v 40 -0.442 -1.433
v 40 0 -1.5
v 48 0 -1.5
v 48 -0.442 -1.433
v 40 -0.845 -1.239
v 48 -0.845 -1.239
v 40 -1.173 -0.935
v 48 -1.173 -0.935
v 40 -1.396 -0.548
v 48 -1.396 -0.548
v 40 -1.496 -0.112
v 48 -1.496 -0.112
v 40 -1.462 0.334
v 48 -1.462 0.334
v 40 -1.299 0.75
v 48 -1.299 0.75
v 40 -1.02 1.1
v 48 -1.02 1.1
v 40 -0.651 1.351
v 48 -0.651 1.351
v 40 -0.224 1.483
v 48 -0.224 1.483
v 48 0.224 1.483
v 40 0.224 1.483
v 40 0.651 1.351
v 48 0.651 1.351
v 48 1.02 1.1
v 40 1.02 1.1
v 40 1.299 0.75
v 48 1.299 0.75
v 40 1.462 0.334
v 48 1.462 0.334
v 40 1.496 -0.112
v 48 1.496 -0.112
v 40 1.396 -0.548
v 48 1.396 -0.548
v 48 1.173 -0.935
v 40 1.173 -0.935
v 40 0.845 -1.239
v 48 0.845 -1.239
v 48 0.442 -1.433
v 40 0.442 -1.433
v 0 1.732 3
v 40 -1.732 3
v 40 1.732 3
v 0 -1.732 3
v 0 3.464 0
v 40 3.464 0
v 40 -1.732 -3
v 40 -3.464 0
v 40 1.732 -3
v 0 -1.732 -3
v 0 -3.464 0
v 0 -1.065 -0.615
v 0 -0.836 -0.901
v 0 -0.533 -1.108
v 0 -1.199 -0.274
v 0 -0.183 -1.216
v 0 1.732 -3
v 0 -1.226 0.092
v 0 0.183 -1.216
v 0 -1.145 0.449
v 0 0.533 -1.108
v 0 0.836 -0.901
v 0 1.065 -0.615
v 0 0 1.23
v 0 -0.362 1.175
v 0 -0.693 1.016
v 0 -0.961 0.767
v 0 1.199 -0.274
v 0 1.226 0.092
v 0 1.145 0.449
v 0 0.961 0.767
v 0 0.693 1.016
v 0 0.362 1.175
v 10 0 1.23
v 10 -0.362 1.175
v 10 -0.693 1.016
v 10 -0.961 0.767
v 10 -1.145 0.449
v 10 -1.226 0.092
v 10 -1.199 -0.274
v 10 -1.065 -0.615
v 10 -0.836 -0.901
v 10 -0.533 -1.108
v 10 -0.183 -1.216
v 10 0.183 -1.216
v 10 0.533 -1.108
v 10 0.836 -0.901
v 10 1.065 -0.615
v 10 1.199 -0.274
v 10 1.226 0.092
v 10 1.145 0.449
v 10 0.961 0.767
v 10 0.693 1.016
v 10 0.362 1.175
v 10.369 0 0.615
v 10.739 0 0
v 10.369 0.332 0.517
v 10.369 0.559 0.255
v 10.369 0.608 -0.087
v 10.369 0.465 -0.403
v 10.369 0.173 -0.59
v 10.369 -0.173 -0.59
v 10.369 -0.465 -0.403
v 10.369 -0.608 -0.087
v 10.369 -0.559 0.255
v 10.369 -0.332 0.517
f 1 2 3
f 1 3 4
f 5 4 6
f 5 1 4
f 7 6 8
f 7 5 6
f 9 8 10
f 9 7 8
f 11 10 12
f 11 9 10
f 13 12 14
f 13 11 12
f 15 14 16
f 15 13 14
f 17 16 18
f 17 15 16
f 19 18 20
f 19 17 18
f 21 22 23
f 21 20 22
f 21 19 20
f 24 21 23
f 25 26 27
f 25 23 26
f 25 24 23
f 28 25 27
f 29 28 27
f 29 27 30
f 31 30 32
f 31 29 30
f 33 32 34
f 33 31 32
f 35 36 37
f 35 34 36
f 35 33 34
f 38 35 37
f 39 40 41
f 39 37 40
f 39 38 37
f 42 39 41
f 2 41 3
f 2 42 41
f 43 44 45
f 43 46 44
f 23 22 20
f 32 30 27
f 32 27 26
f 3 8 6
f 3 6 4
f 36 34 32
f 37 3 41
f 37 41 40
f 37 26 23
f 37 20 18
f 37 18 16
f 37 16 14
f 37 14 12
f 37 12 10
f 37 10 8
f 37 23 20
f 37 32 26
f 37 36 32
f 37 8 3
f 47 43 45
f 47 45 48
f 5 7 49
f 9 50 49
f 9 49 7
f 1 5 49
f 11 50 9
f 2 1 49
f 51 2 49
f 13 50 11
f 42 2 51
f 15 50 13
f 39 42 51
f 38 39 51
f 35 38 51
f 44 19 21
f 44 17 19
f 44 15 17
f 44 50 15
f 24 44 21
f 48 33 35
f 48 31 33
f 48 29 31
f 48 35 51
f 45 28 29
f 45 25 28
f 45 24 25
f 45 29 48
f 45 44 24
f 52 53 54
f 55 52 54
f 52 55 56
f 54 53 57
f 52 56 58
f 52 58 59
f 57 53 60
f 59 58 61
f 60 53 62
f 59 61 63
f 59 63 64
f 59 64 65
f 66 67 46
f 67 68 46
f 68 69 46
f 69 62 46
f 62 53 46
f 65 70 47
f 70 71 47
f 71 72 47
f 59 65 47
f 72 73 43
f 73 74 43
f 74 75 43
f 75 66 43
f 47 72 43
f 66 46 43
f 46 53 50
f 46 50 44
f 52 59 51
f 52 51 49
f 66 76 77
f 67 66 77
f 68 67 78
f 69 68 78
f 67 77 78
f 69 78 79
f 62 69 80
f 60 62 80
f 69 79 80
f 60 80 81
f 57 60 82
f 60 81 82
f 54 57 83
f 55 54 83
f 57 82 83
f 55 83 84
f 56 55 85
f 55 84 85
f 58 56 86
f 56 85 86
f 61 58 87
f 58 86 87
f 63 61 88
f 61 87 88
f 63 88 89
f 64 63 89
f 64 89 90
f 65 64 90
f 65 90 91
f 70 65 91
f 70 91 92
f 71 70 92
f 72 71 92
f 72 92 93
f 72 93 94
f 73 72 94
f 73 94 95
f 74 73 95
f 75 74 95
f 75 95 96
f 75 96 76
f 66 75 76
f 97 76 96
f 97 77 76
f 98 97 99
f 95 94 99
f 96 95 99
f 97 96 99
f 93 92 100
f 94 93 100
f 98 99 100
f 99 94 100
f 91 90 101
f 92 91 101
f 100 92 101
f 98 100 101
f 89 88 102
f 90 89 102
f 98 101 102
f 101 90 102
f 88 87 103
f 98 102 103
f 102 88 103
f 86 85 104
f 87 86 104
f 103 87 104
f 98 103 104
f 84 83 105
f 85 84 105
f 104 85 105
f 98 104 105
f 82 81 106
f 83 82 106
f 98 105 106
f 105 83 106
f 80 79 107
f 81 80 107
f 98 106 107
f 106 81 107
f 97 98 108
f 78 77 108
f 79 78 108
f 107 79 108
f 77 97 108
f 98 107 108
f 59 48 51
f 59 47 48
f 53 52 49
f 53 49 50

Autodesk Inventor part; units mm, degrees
ref_plane "YZ Plane" through (0, 0, 0) normal (1, 0, 0) x (0, 1, 0)
ref_plane "XZ Plane" through (0, 0, 0) normal (0, 1, 0) x (-1, 0, 0)
ref_plane "XY Plane" through (0, 0, 0) normal (0, 0, 1) x (1, 0, 0)
sketch "スケッチ1" plane through (0, 0, 0) normal (1, 0, 0) x (0, 1, 0)
  line L0 (1.7321, -3) -> (-1.7321, -3)
  line L1 (-1.7321, -3) -> (-3.4641, 0)
  line L2 (-3.4641, 0) -> (-1.7321, 3)
  line L3 (-1.7321, 3) -> (1.7321, 3)
  line L4 (1.7321, 3) -> (3.4641, 0)
  line L5 (3.4641, 0) -> (1.7321, -3)
  point P0 (0, 0)
  point P1 (0, 0)
  dimension "d0" = 6
extrude "押し出し1" add sketch "スケッチ1" along normal blind 40
sketch "スケッチ2" plane through (40, 0, 0) normal (1, 0, 0) x (0, 0, -1)
  circle A0 centre (0, 0) radius 1.5
  dimension "d3" = 3
extrude "押し出し2" add sketch "スケッチ2" along normal blind 8
thread "ねじ1" size "M3x0.5" class "6g" standard "ANSI Metric M Profile" full length
sketch "スケッチ3" plane through (0, 0, 0) normal (-1, 0, 0) x (0, 0, 1)
  point P0 (0, 0)
  point P1 (0, 0)
hole "穴1" at (0, 0, 0) direction (1, 0, 0) diameter 2.459 depth 10 tip angle 118 thread size "M3x0.5" class "6H" standard "ISO Metric profile"
properties part number "Spacer_M3_L15" material "鋼、合金"
